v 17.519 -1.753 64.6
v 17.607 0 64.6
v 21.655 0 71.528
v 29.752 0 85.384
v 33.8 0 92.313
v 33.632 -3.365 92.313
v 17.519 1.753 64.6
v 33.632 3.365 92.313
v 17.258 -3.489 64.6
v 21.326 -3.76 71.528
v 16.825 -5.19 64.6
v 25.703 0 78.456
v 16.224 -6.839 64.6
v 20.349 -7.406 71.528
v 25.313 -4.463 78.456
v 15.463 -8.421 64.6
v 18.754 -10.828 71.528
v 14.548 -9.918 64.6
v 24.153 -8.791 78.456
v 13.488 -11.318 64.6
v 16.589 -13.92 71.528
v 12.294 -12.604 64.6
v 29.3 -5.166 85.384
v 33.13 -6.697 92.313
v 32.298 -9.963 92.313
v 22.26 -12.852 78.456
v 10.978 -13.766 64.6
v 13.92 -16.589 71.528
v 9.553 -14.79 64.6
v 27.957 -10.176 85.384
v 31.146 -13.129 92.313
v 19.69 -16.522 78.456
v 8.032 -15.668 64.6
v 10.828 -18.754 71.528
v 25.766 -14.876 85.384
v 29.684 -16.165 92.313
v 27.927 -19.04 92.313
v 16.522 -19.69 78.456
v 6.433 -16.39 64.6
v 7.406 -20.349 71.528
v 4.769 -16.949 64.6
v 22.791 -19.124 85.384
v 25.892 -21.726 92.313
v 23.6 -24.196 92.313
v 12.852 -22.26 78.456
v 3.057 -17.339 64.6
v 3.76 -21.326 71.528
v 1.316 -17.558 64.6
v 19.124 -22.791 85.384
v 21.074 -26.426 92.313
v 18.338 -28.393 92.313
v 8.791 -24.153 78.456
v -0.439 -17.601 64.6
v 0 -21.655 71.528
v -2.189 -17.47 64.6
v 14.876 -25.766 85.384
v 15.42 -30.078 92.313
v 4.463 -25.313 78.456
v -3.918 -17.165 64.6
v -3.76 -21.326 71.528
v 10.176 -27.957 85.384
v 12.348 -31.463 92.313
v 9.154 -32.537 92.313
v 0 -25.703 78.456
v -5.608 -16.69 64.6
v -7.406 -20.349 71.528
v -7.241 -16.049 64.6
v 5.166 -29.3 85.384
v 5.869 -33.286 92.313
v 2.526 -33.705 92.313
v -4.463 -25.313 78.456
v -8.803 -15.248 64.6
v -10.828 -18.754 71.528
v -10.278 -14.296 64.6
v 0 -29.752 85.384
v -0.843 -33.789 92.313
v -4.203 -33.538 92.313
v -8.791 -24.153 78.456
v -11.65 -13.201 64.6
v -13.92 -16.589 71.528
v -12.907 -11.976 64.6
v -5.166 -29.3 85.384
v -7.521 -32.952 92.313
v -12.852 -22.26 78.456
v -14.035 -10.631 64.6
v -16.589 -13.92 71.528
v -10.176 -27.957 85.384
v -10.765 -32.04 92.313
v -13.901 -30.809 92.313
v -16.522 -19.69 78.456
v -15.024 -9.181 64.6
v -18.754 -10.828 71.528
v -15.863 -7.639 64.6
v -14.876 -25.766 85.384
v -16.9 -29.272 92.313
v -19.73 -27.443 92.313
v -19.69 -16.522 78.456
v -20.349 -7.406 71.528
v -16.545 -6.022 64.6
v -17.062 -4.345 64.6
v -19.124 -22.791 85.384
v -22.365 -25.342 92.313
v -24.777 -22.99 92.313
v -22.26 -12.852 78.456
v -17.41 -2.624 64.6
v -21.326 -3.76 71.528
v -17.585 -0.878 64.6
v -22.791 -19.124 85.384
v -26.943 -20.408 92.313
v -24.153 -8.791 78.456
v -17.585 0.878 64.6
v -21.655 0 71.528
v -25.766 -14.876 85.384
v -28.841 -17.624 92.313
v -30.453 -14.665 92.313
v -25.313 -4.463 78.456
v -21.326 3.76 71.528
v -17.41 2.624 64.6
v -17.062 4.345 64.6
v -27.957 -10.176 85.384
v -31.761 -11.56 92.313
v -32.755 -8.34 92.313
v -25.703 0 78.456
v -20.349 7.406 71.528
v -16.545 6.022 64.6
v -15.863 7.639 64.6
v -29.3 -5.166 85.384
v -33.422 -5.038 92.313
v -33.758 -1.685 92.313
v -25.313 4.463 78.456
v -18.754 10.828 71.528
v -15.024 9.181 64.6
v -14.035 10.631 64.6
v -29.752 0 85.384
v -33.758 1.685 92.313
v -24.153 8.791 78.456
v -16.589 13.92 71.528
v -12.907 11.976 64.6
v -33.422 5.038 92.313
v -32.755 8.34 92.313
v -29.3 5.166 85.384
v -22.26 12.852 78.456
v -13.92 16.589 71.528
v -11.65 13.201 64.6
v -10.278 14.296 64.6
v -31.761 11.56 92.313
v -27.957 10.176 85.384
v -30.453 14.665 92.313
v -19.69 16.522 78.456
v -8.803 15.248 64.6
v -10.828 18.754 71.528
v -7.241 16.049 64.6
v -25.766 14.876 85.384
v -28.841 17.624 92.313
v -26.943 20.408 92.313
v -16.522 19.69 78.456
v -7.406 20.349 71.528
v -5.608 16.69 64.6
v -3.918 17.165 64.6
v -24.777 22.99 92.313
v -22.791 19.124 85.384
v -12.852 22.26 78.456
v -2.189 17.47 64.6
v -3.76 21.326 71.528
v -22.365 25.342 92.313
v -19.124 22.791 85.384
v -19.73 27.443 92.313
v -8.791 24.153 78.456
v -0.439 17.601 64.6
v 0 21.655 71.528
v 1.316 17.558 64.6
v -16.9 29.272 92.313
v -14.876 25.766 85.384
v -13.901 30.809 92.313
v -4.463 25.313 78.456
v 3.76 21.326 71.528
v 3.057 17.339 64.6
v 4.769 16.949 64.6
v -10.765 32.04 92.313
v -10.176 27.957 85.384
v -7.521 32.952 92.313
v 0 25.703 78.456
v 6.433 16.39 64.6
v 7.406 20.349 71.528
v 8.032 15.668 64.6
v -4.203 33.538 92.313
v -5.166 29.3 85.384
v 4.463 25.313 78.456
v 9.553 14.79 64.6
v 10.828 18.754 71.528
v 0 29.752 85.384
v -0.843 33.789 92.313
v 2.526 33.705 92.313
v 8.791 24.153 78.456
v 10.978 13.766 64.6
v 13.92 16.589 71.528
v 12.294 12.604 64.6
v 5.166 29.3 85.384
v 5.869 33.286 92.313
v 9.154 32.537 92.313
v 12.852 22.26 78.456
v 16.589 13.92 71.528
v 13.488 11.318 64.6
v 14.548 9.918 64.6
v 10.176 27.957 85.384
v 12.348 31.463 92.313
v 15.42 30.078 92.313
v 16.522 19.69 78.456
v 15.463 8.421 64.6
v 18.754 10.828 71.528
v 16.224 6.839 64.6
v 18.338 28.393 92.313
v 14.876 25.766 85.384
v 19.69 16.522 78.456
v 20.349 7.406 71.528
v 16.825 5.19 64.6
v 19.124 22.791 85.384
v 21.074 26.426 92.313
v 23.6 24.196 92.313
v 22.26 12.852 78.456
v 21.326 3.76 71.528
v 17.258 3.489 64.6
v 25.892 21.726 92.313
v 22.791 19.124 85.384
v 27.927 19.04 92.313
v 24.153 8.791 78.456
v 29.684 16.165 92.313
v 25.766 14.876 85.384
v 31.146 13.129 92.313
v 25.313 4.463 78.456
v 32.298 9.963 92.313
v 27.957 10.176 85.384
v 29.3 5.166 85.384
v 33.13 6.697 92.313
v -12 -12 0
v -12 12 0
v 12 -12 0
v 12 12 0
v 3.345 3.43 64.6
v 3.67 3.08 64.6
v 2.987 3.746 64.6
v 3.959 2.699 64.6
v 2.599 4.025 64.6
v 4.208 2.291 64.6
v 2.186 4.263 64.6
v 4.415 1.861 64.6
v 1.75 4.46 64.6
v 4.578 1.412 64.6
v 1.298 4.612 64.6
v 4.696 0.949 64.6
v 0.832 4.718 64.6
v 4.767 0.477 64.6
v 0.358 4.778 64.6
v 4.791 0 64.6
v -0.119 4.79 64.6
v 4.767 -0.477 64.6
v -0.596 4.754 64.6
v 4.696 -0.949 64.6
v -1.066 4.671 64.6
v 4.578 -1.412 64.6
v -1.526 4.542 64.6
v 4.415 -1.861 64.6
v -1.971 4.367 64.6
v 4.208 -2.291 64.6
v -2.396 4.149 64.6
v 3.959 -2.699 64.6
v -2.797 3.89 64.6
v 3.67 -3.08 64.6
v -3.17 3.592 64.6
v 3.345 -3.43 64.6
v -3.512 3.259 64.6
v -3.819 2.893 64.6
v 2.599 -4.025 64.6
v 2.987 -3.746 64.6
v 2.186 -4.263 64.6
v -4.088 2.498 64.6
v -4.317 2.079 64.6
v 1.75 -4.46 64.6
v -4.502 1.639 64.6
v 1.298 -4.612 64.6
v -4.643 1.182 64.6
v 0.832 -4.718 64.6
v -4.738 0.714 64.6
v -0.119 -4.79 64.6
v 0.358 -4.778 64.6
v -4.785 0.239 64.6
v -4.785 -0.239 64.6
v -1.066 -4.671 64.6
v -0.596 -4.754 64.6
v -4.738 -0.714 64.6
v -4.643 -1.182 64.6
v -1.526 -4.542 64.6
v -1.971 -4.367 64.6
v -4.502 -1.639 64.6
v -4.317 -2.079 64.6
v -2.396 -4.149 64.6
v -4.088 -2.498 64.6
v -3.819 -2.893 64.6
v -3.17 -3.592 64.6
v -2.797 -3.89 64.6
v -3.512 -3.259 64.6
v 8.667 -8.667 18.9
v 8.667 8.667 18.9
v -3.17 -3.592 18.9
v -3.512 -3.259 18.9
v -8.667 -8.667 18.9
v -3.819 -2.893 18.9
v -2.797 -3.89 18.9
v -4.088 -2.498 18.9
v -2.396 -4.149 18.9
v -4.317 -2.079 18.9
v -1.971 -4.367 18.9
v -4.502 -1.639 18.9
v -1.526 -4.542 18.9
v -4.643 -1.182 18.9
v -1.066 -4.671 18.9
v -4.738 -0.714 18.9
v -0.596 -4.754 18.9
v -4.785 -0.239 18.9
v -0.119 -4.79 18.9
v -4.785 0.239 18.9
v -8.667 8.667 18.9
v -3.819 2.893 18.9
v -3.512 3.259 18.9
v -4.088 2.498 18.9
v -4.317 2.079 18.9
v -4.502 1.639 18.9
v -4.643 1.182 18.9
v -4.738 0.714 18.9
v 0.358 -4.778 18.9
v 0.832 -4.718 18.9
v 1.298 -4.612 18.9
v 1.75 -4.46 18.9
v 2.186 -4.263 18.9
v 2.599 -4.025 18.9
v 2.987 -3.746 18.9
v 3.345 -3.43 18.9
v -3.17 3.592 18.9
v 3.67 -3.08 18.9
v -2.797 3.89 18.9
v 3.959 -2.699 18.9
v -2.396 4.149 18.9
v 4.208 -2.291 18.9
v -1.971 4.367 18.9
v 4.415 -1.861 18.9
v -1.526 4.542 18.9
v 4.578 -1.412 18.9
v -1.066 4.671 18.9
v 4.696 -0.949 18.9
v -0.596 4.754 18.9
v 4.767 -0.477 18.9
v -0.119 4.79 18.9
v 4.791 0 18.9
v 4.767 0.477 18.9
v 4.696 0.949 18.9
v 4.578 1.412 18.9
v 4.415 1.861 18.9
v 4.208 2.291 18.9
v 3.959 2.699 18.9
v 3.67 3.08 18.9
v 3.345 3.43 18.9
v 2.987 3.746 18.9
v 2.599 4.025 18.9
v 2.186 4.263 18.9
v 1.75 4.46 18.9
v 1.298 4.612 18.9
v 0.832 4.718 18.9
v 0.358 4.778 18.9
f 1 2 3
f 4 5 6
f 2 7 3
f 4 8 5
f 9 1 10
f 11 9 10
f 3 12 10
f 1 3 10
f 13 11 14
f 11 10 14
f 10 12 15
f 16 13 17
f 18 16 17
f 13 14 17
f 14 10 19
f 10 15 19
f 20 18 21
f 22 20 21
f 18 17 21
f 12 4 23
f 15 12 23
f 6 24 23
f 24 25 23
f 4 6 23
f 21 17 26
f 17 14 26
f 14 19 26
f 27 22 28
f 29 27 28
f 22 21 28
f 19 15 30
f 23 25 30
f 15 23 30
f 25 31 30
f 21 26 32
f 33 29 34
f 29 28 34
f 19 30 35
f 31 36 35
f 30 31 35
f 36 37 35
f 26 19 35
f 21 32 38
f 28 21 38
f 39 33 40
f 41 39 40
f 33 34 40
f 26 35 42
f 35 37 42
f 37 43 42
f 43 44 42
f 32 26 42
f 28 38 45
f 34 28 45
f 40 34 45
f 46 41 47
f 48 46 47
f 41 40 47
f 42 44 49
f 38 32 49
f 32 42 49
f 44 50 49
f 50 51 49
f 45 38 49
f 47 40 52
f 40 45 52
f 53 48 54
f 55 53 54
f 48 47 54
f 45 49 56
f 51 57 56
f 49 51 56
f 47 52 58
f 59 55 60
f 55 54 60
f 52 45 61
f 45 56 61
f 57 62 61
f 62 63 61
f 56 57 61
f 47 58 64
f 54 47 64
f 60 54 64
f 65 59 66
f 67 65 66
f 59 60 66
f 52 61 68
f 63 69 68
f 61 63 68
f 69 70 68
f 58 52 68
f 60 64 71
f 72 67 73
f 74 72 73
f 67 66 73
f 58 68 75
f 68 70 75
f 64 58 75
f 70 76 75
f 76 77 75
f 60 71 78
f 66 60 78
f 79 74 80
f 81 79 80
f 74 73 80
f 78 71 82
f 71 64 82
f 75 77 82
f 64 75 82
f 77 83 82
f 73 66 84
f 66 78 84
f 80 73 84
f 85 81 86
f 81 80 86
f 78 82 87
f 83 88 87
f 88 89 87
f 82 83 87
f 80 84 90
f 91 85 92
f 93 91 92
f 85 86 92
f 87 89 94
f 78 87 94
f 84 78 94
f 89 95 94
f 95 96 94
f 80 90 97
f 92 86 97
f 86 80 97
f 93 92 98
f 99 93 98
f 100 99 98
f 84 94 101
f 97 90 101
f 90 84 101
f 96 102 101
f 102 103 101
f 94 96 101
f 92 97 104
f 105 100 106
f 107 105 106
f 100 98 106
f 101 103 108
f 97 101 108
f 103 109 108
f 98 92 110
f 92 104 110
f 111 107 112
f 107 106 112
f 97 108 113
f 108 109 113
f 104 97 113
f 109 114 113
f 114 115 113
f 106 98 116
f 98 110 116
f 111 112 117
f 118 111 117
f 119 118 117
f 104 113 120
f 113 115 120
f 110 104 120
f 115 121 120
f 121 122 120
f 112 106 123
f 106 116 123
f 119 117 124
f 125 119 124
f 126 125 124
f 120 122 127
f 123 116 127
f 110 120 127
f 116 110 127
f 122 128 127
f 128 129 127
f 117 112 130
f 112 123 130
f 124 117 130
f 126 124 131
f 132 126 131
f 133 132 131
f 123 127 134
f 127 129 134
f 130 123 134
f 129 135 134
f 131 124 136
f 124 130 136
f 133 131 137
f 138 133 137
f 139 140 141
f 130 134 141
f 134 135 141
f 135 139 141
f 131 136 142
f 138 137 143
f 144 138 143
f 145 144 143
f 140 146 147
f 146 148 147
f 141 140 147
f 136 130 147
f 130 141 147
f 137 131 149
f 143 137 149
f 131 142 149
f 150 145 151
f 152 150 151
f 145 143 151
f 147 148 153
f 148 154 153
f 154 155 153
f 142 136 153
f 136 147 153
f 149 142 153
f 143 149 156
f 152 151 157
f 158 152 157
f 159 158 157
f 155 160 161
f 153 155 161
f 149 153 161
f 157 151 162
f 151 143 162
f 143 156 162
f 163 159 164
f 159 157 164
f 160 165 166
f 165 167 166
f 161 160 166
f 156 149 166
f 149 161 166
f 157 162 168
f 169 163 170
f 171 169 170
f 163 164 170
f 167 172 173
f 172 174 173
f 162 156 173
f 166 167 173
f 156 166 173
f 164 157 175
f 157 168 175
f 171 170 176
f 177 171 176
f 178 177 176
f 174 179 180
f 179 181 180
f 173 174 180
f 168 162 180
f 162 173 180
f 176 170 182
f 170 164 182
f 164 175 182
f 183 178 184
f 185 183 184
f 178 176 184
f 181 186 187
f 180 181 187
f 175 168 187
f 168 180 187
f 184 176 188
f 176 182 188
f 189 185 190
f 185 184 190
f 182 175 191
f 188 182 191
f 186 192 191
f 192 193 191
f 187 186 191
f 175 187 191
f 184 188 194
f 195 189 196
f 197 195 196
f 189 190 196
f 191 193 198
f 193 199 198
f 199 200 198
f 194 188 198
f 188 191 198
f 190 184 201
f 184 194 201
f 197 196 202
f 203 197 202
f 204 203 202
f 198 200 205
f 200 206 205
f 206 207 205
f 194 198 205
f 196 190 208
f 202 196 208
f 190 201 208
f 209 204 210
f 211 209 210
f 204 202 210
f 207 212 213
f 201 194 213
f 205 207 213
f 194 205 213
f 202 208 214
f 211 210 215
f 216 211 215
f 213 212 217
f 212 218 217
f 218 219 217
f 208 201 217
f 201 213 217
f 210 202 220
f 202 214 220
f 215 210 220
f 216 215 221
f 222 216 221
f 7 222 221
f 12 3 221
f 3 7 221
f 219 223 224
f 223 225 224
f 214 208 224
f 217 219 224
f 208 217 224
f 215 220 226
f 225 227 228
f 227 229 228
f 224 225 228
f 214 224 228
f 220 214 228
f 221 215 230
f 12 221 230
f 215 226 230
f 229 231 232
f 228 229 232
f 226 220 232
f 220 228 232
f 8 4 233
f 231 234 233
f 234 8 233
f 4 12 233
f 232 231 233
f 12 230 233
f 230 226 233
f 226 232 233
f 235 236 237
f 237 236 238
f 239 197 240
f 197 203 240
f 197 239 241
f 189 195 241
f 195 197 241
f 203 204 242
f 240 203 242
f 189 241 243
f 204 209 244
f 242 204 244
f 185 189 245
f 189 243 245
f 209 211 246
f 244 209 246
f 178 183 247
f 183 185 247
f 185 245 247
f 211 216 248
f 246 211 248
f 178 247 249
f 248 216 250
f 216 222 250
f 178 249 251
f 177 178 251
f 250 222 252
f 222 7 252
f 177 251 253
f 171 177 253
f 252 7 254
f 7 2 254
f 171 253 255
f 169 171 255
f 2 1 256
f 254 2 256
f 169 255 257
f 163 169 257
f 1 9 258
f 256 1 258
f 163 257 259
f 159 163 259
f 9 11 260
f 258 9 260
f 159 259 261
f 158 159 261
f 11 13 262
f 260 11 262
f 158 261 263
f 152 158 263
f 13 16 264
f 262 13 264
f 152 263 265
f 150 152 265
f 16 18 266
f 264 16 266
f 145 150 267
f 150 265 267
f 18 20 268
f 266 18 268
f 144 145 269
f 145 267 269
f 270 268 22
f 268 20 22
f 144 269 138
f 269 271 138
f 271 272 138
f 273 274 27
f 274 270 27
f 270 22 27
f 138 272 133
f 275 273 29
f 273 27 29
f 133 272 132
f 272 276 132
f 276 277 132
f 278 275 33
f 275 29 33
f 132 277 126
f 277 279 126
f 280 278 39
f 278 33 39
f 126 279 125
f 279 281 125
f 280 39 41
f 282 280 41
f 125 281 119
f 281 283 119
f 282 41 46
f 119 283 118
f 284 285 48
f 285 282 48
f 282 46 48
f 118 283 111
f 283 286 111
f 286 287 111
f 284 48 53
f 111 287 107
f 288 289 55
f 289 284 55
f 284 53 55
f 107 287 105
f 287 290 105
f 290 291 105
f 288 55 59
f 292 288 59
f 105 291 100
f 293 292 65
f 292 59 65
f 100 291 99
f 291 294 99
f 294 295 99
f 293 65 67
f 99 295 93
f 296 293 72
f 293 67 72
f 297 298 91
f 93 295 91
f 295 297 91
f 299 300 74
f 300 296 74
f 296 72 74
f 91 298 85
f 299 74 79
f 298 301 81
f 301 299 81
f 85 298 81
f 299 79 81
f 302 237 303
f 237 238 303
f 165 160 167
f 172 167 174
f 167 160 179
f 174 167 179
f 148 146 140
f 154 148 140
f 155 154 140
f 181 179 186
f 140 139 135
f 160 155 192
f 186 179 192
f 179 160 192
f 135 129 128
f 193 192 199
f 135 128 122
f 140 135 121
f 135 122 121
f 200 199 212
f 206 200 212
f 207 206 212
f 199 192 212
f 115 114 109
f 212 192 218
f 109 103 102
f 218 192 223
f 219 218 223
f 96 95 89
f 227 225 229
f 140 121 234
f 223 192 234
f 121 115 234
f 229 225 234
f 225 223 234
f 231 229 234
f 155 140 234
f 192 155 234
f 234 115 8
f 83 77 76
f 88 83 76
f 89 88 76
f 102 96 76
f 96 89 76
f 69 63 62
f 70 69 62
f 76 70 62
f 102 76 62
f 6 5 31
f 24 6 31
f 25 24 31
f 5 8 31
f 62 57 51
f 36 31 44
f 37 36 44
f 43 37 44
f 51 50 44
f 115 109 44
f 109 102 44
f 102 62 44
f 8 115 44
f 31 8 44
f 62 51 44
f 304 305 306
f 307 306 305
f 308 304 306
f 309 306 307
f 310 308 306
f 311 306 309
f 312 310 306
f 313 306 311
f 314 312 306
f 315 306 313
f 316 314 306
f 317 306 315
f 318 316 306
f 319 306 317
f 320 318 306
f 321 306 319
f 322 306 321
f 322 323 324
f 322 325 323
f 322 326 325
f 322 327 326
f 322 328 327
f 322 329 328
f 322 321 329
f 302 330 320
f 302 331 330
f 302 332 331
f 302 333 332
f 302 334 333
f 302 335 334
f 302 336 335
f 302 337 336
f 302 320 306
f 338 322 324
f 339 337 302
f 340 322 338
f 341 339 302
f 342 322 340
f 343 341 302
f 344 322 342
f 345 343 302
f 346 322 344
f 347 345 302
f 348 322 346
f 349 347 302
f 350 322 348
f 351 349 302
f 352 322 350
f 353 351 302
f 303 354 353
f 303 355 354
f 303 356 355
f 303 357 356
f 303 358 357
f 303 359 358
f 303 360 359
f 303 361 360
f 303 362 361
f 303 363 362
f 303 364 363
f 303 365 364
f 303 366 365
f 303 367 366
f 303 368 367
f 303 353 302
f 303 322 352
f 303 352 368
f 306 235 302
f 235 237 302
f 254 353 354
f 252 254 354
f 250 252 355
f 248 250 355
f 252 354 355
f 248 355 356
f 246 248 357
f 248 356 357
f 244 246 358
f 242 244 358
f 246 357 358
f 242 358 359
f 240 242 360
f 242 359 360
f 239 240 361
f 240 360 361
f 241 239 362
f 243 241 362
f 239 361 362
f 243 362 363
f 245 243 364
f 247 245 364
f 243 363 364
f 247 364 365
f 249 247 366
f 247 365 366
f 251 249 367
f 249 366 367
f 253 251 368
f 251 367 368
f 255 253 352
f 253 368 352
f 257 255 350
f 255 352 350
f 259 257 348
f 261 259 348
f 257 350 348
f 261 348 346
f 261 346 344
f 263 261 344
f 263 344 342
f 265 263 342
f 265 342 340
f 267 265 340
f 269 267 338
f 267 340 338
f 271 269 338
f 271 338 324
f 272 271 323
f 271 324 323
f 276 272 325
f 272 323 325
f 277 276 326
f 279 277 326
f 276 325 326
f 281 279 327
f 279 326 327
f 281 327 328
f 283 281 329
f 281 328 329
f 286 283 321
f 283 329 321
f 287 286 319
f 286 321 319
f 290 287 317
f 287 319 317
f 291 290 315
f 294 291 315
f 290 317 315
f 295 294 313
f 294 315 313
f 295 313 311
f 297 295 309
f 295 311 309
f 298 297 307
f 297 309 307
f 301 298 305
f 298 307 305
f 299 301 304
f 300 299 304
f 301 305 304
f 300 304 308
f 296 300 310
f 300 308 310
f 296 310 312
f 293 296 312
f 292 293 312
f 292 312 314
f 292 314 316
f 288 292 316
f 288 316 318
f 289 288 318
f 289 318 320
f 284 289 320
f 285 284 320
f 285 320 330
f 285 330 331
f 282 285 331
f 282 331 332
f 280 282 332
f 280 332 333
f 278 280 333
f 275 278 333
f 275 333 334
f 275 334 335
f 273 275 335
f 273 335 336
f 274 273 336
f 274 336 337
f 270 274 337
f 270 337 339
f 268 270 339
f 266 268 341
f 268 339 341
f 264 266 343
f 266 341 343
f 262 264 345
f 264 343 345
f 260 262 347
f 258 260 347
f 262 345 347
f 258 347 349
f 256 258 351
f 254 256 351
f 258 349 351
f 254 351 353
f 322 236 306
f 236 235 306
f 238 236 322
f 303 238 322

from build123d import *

# Parameters (mm, degrees)
F0_W     = 24
F0_H     = 24
F1_DEPTH = 18.9
F1_TAPER = 10
F2_R     = 4.7910842269
F3_DEPTH = 45.7


with BuildPart() as f1:
    # F0 (on Top) → F1 (new body)
    with BuildSketch(Plane.XY):
        Rectangle(F0_W, F0_H)
    extrude(amount=F1_DEPTH, taper=F1_TAPER)

    # F2 (on face) → F3 (join)
    with BuildSketch(Plane.XY.offset(18.9)):
        Circle(F2_R)
    extrude(amount=F3_DEPTH)

    # F4 (on Front) → F5 (revolve)
    with BuildSketch(Plane.XZ):
        Polygon((0, 92.3125015855), (0, 64.6), (17.6069048751, 64.6), (33.799842, 92.3125015855), align=None)
    revolve(axis=Axis((0, 0, 78.4562507927), (0, 0, -1)))


solid = f1.part
